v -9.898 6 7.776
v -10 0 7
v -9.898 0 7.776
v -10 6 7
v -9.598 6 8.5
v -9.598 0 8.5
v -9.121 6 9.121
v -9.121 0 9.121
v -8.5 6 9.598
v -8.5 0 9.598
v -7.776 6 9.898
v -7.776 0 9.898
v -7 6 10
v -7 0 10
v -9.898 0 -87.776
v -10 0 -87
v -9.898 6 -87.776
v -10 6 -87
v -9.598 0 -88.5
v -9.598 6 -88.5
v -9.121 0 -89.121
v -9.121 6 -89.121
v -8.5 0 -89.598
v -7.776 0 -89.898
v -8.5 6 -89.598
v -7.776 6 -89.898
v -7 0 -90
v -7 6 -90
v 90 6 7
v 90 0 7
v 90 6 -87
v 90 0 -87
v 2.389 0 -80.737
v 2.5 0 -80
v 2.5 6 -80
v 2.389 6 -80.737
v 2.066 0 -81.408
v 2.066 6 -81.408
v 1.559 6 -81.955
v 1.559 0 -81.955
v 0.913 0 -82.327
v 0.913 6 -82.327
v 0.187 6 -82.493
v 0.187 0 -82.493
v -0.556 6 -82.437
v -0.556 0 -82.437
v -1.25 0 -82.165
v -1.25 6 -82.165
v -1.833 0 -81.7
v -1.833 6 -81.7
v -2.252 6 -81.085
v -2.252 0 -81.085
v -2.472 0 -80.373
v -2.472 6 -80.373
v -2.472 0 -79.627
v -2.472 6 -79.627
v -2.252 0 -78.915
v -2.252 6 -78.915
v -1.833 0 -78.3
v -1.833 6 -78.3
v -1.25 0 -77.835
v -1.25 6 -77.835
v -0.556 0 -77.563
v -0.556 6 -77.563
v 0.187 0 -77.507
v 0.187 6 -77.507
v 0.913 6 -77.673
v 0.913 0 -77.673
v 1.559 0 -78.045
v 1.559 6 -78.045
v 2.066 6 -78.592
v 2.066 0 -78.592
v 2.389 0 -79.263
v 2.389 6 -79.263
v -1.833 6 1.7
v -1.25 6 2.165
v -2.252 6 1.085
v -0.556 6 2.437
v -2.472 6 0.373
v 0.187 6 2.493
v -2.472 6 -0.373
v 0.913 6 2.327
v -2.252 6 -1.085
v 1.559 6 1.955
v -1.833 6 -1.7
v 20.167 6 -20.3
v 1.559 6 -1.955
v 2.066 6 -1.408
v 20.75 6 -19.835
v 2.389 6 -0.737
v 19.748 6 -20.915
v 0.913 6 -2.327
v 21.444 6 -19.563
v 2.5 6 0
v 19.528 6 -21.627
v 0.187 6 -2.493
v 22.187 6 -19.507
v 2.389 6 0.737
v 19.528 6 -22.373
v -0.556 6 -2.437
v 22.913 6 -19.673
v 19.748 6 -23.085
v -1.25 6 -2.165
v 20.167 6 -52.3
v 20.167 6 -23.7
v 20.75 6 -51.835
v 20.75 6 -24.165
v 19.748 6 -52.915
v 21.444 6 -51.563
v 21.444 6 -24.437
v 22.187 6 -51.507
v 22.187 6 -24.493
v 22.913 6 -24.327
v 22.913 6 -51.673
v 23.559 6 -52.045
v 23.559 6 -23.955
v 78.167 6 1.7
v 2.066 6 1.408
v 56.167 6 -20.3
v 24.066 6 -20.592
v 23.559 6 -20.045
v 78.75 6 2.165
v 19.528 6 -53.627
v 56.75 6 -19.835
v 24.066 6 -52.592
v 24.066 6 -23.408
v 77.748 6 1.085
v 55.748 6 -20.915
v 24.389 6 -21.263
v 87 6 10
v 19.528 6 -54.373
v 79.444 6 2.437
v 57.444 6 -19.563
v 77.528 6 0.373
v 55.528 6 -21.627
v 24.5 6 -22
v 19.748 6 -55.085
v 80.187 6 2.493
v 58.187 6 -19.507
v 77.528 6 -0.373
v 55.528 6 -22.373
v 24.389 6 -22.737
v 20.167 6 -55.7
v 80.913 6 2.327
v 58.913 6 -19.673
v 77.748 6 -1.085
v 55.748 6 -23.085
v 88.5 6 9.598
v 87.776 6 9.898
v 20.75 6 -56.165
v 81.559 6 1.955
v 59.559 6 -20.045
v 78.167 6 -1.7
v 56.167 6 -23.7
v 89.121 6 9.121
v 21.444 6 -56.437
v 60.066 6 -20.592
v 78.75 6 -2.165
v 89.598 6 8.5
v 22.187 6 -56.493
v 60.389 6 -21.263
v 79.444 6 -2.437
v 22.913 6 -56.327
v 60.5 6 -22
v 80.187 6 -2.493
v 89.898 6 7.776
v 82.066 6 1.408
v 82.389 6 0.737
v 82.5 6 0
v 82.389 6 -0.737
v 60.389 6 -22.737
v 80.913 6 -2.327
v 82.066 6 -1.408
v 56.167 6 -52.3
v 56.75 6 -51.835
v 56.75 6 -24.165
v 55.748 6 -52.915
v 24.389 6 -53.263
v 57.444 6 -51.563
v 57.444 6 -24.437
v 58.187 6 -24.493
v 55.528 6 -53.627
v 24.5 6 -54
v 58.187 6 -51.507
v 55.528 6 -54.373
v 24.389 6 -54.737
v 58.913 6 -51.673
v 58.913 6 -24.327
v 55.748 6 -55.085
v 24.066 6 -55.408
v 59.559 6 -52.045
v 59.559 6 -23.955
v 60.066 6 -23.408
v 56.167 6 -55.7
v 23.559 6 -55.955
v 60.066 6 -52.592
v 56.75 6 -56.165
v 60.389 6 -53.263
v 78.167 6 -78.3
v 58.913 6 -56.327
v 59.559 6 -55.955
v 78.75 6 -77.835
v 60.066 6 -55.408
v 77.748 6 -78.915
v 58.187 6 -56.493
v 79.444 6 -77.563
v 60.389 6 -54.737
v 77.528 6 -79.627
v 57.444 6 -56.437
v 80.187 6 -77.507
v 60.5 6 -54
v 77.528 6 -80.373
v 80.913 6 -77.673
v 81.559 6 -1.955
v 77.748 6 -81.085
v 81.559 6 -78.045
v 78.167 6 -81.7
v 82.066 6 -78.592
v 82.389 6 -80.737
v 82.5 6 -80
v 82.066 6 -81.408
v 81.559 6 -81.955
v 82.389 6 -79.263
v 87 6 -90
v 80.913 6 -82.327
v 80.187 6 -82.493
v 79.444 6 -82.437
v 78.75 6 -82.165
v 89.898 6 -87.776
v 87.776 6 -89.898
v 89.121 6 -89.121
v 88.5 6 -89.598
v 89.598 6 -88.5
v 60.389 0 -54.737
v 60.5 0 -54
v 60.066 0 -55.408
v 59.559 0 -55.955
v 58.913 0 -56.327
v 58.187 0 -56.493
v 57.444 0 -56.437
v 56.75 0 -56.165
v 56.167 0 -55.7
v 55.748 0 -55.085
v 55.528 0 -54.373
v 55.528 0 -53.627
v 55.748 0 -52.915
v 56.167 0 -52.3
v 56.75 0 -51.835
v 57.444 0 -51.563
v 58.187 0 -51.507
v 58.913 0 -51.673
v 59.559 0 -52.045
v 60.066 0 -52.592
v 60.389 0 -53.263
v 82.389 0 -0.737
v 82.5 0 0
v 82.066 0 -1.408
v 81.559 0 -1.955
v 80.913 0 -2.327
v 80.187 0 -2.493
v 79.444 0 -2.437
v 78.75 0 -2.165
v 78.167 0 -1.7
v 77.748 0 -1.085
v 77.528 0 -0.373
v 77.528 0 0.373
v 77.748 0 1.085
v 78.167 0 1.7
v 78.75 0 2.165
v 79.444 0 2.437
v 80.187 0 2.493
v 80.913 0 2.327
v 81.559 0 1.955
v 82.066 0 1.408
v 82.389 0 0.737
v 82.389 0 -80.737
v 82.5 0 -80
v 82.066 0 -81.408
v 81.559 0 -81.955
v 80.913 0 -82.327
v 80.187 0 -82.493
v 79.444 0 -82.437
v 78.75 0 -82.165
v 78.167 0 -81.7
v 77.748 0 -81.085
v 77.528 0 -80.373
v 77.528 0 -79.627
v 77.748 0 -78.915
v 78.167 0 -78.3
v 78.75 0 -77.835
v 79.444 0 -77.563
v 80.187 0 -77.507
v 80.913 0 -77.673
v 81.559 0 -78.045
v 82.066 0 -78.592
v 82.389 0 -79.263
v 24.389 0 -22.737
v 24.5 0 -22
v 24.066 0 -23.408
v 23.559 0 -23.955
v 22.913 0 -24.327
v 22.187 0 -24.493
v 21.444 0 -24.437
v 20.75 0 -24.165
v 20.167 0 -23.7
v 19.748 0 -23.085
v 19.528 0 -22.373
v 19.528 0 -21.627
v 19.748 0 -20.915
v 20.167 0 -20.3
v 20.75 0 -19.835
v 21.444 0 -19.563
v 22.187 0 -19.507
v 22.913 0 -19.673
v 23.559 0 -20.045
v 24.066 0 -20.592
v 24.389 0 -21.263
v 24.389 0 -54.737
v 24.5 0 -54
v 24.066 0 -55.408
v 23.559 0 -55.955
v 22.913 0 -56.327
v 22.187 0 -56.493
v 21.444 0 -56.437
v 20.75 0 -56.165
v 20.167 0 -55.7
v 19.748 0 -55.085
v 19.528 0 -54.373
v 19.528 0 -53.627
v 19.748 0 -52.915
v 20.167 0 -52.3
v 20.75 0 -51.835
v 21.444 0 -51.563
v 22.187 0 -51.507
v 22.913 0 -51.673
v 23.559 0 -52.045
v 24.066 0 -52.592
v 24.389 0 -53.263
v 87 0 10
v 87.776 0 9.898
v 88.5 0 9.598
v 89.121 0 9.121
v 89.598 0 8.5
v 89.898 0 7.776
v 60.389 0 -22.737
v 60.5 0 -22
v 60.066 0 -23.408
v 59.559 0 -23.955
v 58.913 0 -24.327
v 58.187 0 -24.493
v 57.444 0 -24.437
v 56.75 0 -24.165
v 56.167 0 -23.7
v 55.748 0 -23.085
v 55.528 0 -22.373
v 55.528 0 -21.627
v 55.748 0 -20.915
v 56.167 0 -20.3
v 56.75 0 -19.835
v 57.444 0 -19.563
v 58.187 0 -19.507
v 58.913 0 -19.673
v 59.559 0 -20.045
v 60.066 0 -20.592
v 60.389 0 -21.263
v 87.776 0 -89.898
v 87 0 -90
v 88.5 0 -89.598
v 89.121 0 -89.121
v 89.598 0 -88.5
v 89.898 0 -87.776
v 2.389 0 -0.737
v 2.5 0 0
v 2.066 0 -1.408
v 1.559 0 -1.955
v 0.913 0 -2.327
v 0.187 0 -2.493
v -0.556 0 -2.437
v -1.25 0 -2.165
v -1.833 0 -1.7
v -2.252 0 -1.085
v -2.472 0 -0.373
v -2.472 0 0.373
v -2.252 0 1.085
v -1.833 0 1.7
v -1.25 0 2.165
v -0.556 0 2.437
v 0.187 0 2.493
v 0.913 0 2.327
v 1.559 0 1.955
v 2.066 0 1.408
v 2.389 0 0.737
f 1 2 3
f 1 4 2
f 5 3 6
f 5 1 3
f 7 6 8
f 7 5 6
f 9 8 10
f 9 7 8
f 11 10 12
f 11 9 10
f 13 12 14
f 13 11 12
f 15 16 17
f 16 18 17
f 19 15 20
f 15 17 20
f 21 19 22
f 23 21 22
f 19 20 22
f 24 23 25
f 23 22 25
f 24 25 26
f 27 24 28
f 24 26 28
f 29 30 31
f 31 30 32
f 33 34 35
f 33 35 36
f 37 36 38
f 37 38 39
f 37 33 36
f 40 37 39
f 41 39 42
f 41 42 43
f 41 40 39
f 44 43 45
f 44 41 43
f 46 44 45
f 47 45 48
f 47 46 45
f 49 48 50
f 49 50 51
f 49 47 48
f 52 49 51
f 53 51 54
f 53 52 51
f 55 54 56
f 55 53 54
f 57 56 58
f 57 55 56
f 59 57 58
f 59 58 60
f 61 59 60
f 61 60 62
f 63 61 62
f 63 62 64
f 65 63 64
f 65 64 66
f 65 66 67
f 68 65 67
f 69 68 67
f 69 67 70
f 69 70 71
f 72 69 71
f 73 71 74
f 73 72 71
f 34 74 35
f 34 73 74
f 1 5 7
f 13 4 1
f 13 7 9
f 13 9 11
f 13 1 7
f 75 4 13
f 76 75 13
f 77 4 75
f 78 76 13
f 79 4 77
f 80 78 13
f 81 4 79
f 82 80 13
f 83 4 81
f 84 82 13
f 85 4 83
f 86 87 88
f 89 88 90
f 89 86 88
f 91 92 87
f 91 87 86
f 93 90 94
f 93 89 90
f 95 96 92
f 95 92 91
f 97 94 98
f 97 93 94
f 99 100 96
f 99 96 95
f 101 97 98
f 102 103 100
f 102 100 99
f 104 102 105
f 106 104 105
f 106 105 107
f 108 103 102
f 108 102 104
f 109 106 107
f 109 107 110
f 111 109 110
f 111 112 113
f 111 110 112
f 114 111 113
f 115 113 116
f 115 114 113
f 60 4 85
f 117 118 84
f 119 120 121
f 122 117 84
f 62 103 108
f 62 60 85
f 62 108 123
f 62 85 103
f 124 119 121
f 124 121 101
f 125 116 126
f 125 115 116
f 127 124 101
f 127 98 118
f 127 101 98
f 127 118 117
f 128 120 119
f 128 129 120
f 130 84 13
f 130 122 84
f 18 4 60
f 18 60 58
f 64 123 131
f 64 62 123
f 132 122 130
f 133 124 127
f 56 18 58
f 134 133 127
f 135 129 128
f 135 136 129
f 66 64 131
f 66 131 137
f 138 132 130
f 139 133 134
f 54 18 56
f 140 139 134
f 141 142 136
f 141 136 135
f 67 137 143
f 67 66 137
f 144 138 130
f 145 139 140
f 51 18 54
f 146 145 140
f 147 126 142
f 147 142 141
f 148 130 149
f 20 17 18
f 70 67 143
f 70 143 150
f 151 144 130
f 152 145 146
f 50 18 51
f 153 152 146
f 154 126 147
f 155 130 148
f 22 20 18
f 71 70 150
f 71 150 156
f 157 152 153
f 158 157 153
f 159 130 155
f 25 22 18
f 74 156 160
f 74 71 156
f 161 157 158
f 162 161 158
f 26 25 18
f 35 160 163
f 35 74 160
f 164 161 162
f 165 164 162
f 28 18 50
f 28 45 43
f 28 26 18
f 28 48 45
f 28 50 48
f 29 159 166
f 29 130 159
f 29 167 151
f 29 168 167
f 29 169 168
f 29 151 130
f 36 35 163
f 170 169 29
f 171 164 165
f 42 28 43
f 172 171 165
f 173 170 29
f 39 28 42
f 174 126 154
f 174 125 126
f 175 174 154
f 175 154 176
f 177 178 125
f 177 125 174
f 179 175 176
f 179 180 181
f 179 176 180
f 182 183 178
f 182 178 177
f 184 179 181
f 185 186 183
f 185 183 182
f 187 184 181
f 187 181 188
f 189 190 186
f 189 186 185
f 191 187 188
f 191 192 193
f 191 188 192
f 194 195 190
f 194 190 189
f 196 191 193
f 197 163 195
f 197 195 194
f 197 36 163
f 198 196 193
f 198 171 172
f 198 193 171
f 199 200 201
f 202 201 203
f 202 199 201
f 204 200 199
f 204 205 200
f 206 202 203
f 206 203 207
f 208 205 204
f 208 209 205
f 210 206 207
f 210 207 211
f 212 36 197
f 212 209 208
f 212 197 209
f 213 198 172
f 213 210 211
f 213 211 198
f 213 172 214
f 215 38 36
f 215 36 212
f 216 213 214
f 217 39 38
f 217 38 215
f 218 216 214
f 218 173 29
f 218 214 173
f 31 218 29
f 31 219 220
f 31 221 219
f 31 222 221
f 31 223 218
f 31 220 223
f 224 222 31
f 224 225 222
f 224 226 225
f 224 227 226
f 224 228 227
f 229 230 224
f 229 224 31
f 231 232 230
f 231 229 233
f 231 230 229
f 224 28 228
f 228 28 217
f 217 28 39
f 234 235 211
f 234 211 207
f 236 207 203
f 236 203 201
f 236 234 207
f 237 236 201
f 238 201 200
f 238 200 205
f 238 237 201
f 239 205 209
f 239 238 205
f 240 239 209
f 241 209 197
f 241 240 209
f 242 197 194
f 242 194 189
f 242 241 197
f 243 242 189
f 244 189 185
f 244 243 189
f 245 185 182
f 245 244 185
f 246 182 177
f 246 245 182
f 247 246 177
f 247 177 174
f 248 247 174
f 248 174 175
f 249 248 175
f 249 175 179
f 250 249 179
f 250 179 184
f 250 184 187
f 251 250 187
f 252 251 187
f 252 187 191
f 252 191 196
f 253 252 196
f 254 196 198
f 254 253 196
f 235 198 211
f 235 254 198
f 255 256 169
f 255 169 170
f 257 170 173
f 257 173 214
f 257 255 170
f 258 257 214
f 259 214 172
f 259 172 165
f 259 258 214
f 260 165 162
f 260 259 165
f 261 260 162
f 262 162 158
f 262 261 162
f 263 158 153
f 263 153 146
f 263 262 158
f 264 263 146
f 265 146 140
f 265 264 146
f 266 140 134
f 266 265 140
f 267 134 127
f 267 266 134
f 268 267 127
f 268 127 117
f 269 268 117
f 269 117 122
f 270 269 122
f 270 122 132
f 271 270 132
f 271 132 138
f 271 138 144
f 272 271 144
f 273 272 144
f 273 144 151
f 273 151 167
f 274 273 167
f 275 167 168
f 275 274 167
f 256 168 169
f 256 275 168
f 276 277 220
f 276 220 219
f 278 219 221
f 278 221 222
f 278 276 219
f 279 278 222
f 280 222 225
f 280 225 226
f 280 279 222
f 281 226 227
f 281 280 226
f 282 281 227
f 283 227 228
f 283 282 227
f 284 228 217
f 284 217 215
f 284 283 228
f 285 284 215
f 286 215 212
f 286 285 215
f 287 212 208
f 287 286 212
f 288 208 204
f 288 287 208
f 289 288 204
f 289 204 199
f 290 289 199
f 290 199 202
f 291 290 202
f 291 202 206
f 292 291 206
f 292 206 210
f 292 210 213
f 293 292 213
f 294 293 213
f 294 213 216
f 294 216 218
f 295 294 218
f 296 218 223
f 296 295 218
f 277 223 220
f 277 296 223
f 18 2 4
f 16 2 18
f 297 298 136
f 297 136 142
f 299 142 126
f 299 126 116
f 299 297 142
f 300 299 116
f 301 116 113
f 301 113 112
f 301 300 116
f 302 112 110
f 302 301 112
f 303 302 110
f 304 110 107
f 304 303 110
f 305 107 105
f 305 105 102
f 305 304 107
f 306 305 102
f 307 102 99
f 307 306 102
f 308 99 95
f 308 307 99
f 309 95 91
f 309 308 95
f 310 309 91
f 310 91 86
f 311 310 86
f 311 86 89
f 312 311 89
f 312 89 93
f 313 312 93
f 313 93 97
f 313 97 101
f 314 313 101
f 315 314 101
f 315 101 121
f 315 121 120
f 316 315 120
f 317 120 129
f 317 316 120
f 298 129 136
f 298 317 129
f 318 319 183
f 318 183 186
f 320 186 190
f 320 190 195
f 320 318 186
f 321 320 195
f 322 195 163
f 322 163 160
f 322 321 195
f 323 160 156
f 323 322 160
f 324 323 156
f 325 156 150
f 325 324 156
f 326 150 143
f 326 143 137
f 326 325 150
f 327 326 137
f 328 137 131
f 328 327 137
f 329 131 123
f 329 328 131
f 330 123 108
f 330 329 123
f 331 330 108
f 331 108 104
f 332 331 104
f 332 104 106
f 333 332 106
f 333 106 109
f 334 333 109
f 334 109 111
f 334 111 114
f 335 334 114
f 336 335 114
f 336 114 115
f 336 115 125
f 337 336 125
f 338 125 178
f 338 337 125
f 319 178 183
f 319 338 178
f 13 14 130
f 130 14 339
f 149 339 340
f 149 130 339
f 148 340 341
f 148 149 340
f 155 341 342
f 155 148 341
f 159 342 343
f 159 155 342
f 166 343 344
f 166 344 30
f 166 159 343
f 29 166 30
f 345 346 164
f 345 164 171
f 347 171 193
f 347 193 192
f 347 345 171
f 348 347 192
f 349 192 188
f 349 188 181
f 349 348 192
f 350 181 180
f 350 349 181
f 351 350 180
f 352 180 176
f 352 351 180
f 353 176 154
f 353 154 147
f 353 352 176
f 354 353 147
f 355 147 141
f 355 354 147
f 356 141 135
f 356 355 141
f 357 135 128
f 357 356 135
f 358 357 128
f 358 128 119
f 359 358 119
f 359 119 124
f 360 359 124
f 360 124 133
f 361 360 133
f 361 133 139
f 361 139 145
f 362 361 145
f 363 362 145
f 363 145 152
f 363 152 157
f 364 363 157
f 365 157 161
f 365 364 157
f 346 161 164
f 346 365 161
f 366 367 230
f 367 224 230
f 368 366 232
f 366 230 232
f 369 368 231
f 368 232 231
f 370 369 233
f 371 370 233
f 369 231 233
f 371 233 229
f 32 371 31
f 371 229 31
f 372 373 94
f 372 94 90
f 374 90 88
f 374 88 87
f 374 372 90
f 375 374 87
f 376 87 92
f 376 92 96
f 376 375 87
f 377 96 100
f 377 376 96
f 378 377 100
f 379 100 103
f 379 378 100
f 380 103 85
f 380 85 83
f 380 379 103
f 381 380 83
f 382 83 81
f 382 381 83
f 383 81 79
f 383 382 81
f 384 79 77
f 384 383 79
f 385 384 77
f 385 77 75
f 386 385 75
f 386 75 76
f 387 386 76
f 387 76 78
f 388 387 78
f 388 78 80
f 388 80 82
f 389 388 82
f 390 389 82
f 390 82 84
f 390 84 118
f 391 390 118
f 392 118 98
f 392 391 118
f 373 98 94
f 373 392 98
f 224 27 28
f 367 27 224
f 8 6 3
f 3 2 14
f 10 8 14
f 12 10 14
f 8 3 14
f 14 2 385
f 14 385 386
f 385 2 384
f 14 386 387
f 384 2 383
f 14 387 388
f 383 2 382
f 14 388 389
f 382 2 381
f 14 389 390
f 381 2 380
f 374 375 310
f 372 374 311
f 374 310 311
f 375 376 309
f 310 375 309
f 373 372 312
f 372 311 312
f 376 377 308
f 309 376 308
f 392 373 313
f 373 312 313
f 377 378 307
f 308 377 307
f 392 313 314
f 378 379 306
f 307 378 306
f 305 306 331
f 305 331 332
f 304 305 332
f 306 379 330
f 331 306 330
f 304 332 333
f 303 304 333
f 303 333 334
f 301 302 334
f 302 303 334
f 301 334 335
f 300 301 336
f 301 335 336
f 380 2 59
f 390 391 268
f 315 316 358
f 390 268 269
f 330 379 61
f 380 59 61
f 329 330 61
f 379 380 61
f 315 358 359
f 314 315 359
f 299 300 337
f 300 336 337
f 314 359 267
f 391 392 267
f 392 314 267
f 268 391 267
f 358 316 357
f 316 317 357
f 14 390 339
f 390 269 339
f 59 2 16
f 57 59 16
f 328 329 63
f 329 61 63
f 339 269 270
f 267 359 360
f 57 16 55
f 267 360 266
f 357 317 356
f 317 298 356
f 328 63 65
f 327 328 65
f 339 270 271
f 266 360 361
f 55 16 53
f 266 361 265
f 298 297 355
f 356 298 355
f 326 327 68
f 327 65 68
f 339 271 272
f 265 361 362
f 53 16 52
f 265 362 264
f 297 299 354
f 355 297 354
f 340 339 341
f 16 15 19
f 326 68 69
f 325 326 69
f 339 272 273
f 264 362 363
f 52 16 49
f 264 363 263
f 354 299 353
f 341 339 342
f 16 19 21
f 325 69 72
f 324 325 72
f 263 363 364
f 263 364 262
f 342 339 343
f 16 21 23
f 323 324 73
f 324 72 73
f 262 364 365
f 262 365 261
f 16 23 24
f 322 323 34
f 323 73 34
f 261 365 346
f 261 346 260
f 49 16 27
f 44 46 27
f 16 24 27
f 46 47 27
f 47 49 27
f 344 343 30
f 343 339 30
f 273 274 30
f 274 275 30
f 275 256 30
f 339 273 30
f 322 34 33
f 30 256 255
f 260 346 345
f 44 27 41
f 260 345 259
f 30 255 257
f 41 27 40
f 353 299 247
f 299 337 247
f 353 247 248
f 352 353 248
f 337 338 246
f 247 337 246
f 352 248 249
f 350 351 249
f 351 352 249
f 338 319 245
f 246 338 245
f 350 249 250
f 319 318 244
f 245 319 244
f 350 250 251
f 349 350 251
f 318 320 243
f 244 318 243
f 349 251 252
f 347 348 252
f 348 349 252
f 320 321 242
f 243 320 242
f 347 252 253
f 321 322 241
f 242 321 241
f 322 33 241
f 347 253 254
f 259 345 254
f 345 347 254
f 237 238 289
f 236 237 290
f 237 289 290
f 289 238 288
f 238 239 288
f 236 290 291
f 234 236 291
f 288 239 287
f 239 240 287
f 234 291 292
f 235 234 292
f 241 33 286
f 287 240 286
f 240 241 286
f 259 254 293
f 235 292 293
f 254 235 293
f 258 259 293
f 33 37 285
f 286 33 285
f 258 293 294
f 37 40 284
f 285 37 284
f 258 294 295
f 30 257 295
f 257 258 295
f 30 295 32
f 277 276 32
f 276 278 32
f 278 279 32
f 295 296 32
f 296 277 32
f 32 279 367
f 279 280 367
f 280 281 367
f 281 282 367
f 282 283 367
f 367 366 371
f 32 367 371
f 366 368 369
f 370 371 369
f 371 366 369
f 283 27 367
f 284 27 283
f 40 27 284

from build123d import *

# Parameters (mm, degrees)
SKETCH1_W           = 100
SKETCH1_H           = 100
SKETCH1_R           = 2.5
BOSS_EXTRUDE1_DEPTH = 6
FILLET1_R           = 3
FILLET2_R           = 3


with BuildPart() as part:
    # Sketch1 → Boss-Extrude1 (new body)
    with BuildSketch(Plane(origin=(0, 0, 0), x_dir=(1, 0, 0), z_dir=(0, 1, 0))):
        with Locations((40, 40)):
            Rectangle(SKETCH1_W, SKETCH1_H)
        Circle(SKETCH1_R, mode=Mode.SUBTRACT)
        with Locations((80, 0)):
            Circle(SKETCH1_R, mode=Mode.SUBTRACT)
        with Locations((0, 80)):
            Circle(SKETCH1_R, mode=Mode.SUBTRACT)
        with Locations((80, 80)):
            Circle(SKETCH1_R, mode=Mode.SUBTRACT)
        with Locations((22, 22)):
            Circle(SKETCH1_R, mode=Mode.SUBTRACT)
        with Locations((58, 22)):
            Circle(SKETCH1_R, mode=Mode.SUBTRACT)
        with Locations((22, 54)):
            Circle(SKETCH1_R, mode=Mode.SUBTRACT)
        with Locations((58, 54)):
            Circle(SKETCH1_R, mode=Mode.SUBTRACT)
    extrude(amount=BOSS_EXTRUDE1_DEPTH)

    # Fillet1
    fillet1_edges = [part.edges().sort_by_distance(p)[0] for p in [
        (90, 3, 10),
        (-10, 3, 10),
    ]]
    fillet(fillet1_edges, radius=FILLET1_R)

    # Fillet2
    fillet2_edges = [part.edges().sort_by_distance(p)[0] for p in [
        (-10, 3, -90),
        (90, 3, -90),
    ]]
    fillet(fillet2_edges, radius=FILLET2_R)


solid = part.part
